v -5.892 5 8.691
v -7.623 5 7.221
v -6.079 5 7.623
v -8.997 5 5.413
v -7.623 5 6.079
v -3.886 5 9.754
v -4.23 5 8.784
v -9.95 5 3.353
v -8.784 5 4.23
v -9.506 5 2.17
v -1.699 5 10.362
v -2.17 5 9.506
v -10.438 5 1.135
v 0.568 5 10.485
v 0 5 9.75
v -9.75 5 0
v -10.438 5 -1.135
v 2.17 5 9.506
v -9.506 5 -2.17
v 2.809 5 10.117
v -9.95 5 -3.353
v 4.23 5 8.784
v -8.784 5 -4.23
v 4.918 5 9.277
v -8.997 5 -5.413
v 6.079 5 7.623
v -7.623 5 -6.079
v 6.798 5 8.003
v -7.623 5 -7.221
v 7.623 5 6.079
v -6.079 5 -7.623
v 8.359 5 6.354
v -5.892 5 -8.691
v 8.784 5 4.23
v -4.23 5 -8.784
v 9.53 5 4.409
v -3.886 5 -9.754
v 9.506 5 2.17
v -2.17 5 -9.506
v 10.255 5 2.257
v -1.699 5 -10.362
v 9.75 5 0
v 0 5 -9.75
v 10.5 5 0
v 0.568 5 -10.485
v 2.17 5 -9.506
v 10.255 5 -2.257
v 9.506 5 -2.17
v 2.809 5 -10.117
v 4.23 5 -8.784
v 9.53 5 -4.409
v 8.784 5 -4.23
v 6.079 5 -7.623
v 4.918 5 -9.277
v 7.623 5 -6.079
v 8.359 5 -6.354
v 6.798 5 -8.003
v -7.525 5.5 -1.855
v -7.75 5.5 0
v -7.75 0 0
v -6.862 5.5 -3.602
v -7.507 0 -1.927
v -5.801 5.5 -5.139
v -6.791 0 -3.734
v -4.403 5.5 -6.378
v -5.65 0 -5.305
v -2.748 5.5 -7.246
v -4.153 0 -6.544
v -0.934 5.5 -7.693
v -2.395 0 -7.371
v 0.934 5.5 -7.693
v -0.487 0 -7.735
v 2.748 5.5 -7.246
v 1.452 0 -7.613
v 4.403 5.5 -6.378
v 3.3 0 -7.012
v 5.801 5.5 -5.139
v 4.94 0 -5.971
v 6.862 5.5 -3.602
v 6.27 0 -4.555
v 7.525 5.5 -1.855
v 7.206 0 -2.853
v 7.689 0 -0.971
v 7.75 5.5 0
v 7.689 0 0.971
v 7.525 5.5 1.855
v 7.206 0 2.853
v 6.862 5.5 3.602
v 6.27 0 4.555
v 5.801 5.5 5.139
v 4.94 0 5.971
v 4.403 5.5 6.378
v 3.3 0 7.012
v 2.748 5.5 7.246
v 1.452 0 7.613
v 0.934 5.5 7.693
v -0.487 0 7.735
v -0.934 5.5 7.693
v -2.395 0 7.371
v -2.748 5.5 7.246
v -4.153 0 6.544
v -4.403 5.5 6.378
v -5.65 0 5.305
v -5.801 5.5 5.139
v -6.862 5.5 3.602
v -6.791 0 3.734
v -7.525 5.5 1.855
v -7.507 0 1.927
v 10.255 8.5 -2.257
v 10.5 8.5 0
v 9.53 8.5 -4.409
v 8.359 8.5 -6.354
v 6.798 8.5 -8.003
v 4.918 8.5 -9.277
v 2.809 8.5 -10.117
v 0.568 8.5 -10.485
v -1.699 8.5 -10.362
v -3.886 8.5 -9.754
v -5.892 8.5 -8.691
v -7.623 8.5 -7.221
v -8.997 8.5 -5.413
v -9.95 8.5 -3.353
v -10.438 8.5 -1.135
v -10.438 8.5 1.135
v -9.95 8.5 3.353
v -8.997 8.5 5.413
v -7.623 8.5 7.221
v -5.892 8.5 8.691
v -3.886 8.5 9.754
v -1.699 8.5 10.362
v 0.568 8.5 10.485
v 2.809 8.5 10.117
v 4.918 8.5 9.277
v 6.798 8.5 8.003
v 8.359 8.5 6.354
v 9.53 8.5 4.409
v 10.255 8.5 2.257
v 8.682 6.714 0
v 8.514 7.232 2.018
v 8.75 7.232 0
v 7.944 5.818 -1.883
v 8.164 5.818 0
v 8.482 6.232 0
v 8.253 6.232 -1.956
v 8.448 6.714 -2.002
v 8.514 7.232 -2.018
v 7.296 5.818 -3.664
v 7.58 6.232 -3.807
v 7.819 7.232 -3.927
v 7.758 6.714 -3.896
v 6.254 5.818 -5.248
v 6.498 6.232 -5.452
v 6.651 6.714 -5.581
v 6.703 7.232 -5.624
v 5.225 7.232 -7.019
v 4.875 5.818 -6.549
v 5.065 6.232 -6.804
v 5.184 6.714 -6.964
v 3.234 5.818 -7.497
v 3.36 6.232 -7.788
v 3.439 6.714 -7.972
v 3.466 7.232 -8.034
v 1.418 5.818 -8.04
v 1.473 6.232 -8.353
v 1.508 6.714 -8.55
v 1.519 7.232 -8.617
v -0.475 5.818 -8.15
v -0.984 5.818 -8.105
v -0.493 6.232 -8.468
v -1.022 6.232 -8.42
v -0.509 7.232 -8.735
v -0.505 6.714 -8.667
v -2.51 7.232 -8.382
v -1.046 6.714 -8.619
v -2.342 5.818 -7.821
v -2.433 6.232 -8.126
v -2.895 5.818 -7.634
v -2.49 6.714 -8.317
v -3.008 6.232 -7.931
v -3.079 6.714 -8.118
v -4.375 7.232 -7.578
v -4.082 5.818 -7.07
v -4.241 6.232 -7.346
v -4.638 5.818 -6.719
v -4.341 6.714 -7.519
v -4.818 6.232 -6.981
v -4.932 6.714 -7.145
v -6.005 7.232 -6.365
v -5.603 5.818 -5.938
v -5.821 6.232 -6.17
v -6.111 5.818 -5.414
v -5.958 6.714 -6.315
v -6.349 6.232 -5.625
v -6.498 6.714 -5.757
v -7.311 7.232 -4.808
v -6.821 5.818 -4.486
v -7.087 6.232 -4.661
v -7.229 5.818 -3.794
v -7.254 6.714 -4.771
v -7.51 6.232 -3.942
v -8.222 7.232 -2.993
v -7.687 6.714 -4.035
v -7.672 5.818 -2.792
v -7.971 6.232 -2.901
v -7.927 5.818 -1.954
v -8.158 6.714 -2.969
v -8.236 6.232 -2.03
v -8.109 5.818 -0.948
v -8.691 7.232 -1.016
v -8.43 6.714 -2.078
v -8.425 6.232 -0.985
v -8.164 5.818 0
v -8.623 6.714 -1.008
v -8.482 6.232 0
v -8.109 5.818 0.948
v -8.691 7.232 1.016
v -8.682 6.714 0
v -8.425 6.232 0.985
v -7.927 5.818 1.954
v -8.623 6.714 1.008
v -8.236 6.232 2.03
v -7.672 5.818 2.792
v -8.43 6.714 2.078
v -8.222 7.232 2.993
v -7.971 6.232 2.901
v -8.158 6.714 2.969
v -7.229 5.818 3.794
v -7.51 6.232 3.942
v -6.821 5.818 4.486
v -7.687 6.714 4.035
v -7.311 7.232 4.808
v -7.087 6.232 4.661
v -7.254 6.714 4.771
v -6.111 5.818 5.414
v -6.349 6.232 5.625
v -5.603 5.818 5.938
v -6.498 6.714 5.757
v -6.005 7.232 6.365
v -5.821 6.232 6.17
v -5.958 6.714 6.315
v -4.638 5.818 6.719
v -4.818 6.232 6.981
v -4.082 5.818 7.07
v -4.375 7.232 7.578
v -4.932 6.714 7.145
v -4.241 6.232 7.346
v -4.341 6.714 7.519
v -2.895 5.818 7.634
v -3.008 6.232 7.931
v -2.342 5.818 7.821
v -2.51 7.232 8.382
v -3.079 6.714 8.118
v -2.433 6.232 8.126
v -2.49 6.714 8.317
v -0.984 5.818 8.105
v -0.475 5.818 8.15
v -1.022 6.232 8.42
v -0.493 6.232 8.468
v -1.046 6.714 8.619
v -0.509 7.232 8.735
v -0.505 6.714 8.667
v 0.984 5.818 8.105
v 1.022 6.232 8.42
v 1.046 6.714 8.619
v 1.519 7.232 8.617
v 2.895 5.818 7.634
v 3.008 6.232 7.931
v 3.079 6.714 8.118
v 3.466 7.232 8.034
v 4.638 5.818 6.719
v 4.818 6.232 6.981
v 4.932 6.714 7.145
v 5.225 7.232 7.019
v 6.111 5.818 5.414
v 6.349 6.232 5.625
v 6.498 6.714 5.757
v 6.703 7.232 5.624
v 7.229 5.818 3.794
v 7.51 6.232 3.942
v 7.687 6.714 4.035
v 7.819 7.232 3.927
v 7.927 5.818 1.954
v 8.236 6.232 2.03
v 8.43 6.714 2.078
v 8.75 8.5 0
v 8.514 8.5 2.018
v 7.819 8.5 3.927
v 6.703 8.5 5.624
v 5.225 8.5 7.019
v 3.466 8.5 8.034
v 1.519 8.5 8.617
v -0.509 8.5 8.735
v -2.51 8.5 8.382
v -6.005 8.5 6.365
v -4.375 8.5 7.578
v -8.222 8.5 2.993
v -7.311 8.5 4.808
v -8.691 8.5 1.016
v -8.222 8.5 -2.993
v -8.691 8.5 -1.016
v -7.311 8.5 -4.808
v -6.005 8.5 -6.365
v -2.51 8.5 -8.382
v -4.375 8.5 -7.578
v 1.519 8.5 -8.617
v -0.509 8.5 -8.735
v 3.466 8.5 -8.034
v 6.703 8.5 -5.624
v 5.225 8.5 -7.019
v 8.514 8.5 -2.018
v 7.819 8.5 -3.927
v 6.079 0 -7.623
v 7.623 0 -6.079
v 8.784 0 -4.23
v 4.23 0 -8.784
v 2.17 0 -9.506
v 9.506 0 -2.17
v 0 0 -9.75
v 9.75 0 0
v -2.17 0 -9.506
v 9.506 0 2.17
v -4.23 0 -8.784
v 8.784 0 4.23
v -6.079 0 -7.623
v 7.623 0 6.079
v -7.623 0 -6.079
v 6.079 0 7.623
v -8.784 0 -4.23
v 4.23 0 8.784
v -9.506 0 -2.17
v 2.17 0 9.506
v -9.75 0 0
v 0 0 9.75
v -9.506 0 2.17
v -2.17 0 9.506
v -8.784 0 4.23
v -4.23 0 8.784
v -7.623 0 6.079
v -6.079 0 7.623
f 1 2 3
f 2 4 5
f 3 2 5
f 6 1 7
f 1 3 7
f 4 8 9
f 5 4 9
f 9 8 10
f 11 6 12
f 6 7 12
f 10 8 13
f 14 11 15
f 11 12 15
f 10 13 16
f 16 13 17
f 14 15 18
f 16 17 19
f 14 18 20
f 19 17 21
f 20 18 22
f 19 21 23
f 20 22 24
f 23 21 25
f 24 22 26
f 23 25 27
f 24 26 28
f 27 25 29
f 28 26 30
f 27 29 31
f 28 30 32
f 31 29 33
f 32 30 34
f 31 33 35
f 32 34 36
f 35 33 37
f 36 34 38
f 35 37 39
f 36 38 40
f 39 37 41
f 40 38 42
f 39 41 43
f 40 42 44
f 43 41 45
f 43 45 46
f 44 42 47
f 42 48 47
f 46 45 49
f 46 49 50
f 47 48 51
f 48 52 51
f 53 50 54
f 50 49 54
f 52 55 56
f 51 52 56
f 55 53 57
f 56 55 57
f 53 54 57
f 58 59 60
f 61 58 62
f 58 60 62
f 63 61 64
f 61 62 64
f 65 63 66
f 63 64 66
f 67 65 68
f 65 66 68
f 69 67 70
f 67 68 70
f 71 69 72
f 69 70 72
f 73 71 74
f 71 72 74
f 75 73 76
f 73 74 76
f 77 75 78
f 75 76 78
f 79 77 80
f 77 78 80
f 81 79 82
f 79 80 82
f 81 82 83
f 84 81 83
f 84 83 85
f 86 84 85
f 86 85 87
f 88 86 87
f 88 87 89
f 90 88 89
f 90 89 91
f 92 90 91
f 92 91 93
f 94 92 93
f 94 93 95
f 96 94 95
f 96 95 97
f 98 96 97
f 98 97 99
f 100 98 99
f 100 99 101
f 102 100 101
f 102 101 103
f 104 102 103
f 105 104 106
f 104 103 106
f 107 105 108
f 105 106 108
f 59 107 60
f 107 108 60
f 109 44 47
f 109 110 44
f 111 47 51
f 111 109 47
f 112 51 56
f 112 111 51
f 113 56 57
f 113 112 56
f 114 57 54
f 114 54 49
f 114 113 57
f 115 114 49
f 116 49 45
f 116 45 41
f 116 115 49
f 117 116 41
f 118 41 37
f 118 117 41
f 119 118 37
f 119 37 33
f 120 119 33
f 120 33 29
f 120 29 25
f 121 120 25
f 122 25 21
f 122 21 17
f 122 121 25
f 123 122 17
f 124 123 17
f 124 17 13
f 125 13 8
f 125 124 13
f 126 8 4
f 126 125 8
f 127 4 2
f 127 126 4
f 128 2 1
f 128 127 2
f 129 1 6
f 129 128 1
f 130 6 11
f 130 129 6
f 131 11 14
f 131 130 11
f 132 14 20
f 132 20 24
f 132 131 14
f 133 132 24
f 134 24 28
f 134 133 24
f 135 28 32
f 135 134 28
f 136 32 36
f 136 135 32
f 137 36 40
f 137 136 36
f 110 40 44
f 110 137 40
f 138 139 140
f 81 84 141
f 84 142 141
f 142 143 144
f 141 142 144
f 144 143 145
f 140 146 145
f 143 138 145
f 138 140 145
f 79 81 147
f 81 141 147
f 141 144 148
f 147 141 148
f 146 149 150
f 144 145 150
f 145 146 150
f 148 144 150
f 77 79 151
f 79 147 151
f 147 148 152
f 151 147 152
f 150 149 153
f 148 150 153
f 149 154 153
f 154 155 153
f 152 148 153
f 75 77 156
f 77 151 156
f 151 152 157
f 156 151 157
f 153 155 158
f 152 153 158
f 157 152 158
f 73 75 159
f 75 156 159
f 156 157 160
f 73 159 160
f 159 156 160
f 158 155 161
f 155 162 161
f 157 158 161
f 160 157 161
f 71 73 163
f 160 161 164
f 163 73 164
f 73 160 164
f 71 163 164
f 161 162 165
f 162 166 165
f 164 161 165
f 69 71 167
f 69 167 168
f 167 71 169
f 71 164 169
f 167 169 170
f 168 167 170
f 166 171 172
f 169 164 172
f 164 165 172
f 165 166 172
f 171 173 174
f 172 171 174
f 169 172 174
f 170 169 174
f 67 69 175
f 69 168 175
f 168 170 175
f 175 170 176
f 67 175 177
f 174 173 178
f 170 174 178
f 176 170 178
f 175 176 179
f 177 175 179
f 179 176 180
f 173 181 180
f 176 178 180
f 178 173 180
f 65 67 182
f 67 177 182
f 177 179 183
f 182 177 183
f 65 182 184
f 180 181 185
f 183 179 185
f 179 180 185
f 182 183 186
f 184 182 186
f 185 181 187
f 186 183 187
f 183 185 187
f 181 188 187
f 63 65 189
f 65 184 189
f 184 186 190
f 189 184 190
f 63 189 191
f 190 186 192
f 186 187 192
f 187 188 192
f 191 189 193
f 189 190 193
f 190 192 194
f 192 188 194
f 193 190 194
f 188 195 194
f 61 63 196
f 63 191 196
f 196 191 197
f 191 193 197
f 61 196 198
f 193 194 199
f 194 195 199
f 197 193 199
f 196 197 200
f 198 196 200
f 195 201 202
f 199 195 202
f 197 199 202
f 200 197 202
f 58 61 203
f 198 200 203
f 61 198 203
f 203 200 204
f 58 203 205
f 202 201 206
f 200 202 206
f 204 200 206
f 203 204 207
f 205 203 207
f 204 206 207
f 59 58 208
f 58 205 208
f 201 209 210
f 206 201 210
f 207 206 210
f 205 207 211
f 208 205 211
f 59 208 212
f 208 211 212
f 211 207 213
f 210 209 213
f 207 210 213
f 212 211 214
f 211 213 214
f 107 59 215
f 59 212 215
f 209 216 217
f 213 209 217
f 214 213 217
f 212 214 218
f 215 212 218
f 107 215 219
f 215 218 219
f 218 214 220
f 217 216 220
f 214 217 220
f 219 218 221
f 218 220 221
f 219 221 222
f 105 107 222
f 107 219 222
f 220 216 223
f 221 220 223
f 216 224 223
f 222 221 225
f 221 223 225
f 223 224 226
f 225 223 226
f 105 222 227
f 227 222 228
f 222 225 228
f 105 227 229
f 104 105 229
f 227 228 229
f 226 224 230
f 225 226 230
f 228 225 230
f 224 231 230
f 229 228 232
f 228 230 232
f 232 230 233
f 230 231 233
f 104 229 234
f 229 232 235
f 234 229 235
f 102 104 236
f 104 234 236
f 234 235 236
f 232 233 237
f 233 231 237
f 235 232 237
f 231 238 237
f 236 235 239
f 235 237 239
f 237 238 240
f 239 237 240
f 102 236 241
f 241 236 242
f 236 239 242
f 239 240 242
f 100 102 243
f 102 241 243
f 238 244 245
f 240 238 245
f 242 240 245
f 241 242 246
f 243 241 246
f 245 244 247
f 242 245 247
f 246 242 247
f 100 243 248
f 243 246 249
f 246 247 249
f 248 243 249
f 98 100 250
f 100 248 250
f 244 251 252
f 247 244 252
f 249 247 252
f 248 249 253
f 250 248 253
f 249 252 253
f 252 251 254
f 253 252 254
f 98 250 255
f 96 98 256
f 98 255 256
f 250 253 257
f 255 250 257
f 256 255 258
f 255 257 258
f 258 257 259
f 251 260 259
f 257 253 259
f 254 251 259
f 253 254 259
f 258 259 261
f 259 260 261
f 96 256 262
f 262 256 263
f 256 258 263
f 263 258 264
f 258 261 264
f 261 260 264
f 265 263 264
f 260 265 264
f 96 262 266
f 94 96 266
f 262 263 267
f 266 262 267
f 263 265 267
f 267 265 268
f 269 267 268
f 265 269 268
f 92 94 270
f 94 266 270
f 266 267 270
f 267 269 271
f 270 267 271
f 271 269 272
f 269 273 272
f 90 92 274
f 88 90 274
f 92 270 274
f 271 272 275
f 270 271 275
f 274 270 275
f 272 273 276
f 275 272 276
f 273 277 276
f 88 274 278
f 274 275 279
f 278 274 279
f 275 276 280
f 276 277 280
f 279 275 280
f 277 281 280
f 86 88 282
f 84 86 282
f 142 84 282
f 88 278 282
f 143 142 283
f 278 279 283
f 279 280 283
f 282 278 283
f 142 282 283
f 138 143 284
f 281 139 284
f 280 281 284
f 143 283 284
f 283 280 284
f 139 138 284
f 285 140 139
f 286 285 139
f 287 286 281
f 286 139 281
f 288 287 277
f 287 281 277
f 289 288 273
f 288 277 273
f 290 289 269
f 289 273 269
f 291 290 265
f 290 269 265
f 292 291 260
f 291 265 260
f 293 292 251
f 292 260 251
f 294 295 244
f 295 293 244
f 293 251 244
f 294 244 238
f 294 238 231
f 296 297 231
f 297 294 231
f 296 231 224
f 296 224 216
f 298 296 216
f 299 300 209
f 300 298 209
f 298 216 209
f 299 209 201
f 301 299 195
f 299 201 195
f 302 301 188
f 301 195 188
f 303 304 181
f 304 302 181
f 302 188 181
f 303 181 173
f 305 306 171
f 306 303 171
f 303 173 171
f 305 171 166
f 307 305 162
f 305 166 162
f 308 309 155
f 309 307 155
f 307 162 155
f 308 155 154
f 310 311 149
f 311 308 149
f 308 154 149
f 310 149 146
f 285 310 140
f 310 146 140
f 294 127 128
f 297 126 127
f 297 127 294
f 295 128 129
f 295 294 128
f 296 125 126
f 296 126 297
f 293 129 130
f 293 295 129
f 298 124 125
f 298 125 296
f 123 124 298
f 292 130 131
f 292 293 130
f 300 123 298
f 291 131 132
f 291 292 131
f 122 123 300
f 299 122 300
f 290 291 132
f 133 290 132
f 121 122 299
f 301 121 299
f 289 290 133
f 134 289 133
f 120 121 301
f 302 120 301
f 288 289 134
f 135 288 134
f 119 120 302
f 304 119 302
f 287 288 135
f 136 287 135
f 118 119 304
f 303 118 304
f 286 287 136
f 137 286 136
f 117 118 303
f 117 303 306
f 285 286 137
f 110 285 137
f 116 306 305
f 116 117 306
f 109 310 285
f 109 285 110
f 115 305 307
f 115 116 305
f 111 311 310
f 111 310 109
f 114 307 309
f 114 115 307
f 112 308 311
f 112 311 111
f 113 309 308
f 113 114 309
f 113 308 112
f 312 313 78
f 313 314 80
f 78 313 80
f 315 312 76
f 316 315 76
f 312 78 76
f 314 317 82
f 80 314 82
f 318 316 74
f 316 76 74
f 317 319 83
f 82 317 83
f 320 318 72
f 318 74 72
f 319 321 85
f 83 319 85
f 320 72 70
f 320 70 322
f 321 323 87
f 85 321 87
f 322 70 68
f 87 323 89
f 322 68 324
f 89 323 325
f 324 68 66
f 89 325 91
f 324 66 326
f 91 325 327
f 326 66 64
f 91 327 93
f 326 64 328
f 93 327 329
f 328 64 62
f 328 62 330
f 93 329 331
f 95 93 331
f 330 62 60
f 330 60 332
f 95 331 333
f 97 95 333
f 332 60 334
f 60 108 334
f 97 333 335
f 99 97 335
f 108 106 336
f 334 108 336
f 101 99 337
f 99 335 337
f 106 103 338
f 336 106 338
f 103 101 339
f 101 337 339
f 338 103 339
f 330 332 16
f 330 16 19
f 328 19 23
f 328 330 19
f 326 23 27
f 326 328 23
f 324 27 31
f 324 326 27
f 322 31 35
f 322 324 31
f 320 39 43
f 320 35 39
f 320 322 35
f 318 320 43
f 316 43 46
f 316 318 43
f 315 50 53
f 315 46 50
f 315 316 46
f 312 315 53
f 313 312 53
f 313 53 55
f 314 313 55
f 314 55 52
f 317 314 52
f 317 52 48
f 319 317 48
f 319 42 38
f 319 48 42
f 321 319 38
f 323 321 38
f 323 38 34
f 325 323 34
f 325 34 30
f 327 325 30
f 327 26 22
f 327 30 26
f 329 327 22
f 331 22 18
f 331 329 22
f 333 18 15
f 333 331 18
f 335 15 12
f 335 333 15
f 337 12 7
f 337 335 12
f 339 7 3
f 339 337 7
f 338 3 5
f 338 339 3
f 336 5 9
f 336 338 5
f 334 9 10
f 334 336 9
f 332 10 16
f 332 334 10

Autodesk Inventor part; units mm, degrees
ref_plane "YZ Plane" through (0, 0, 0) normal (1, 0, 0) x (0, 1, 0)
ref_plane "XZ Plane" through (0, 0, 0) normal (0, 1, 0) x (-1, 0, 0)
ref_plane "XY Plane" through (0, 0, 0) normal (0, 0, 1) x (1, 0, 0)
sketch "Sketch1" plane through (0, 0, 0) normal (0, 1, 0) x (-1, 0, 0)
  circle A0 centre (0, 0) radius 7.75
  circle A1 centre (0, 0) radius 9.75
  dimension "d0" = 15.5
  dimension "d1" = 19.5
extrude "Extrusion1" add sketch "Sketch1" along normal blind 5.5
sketch "Sketch5" plane through (0, 5.5, 0) normal (0, 1, 0) x (1, 0, 0)
  circle A0 centre (0, 0) radius 10.5
  circle A1 centre (0, 0) radius 8.75
  dimension "d14" = 21
  dimension "d15" = 17.5
extrude "Extrusion5" add sketch "Sketch5" along normal blind 3
fillet "Fillet1" radius 2 1 edges at (-8.75, 5.5, 0)
move faces "Move1" translate (0, -0.5, 0) faces at (10.0539, 5.5, 1.6154)
properties part number "685ZZFlanged_Adapter"
